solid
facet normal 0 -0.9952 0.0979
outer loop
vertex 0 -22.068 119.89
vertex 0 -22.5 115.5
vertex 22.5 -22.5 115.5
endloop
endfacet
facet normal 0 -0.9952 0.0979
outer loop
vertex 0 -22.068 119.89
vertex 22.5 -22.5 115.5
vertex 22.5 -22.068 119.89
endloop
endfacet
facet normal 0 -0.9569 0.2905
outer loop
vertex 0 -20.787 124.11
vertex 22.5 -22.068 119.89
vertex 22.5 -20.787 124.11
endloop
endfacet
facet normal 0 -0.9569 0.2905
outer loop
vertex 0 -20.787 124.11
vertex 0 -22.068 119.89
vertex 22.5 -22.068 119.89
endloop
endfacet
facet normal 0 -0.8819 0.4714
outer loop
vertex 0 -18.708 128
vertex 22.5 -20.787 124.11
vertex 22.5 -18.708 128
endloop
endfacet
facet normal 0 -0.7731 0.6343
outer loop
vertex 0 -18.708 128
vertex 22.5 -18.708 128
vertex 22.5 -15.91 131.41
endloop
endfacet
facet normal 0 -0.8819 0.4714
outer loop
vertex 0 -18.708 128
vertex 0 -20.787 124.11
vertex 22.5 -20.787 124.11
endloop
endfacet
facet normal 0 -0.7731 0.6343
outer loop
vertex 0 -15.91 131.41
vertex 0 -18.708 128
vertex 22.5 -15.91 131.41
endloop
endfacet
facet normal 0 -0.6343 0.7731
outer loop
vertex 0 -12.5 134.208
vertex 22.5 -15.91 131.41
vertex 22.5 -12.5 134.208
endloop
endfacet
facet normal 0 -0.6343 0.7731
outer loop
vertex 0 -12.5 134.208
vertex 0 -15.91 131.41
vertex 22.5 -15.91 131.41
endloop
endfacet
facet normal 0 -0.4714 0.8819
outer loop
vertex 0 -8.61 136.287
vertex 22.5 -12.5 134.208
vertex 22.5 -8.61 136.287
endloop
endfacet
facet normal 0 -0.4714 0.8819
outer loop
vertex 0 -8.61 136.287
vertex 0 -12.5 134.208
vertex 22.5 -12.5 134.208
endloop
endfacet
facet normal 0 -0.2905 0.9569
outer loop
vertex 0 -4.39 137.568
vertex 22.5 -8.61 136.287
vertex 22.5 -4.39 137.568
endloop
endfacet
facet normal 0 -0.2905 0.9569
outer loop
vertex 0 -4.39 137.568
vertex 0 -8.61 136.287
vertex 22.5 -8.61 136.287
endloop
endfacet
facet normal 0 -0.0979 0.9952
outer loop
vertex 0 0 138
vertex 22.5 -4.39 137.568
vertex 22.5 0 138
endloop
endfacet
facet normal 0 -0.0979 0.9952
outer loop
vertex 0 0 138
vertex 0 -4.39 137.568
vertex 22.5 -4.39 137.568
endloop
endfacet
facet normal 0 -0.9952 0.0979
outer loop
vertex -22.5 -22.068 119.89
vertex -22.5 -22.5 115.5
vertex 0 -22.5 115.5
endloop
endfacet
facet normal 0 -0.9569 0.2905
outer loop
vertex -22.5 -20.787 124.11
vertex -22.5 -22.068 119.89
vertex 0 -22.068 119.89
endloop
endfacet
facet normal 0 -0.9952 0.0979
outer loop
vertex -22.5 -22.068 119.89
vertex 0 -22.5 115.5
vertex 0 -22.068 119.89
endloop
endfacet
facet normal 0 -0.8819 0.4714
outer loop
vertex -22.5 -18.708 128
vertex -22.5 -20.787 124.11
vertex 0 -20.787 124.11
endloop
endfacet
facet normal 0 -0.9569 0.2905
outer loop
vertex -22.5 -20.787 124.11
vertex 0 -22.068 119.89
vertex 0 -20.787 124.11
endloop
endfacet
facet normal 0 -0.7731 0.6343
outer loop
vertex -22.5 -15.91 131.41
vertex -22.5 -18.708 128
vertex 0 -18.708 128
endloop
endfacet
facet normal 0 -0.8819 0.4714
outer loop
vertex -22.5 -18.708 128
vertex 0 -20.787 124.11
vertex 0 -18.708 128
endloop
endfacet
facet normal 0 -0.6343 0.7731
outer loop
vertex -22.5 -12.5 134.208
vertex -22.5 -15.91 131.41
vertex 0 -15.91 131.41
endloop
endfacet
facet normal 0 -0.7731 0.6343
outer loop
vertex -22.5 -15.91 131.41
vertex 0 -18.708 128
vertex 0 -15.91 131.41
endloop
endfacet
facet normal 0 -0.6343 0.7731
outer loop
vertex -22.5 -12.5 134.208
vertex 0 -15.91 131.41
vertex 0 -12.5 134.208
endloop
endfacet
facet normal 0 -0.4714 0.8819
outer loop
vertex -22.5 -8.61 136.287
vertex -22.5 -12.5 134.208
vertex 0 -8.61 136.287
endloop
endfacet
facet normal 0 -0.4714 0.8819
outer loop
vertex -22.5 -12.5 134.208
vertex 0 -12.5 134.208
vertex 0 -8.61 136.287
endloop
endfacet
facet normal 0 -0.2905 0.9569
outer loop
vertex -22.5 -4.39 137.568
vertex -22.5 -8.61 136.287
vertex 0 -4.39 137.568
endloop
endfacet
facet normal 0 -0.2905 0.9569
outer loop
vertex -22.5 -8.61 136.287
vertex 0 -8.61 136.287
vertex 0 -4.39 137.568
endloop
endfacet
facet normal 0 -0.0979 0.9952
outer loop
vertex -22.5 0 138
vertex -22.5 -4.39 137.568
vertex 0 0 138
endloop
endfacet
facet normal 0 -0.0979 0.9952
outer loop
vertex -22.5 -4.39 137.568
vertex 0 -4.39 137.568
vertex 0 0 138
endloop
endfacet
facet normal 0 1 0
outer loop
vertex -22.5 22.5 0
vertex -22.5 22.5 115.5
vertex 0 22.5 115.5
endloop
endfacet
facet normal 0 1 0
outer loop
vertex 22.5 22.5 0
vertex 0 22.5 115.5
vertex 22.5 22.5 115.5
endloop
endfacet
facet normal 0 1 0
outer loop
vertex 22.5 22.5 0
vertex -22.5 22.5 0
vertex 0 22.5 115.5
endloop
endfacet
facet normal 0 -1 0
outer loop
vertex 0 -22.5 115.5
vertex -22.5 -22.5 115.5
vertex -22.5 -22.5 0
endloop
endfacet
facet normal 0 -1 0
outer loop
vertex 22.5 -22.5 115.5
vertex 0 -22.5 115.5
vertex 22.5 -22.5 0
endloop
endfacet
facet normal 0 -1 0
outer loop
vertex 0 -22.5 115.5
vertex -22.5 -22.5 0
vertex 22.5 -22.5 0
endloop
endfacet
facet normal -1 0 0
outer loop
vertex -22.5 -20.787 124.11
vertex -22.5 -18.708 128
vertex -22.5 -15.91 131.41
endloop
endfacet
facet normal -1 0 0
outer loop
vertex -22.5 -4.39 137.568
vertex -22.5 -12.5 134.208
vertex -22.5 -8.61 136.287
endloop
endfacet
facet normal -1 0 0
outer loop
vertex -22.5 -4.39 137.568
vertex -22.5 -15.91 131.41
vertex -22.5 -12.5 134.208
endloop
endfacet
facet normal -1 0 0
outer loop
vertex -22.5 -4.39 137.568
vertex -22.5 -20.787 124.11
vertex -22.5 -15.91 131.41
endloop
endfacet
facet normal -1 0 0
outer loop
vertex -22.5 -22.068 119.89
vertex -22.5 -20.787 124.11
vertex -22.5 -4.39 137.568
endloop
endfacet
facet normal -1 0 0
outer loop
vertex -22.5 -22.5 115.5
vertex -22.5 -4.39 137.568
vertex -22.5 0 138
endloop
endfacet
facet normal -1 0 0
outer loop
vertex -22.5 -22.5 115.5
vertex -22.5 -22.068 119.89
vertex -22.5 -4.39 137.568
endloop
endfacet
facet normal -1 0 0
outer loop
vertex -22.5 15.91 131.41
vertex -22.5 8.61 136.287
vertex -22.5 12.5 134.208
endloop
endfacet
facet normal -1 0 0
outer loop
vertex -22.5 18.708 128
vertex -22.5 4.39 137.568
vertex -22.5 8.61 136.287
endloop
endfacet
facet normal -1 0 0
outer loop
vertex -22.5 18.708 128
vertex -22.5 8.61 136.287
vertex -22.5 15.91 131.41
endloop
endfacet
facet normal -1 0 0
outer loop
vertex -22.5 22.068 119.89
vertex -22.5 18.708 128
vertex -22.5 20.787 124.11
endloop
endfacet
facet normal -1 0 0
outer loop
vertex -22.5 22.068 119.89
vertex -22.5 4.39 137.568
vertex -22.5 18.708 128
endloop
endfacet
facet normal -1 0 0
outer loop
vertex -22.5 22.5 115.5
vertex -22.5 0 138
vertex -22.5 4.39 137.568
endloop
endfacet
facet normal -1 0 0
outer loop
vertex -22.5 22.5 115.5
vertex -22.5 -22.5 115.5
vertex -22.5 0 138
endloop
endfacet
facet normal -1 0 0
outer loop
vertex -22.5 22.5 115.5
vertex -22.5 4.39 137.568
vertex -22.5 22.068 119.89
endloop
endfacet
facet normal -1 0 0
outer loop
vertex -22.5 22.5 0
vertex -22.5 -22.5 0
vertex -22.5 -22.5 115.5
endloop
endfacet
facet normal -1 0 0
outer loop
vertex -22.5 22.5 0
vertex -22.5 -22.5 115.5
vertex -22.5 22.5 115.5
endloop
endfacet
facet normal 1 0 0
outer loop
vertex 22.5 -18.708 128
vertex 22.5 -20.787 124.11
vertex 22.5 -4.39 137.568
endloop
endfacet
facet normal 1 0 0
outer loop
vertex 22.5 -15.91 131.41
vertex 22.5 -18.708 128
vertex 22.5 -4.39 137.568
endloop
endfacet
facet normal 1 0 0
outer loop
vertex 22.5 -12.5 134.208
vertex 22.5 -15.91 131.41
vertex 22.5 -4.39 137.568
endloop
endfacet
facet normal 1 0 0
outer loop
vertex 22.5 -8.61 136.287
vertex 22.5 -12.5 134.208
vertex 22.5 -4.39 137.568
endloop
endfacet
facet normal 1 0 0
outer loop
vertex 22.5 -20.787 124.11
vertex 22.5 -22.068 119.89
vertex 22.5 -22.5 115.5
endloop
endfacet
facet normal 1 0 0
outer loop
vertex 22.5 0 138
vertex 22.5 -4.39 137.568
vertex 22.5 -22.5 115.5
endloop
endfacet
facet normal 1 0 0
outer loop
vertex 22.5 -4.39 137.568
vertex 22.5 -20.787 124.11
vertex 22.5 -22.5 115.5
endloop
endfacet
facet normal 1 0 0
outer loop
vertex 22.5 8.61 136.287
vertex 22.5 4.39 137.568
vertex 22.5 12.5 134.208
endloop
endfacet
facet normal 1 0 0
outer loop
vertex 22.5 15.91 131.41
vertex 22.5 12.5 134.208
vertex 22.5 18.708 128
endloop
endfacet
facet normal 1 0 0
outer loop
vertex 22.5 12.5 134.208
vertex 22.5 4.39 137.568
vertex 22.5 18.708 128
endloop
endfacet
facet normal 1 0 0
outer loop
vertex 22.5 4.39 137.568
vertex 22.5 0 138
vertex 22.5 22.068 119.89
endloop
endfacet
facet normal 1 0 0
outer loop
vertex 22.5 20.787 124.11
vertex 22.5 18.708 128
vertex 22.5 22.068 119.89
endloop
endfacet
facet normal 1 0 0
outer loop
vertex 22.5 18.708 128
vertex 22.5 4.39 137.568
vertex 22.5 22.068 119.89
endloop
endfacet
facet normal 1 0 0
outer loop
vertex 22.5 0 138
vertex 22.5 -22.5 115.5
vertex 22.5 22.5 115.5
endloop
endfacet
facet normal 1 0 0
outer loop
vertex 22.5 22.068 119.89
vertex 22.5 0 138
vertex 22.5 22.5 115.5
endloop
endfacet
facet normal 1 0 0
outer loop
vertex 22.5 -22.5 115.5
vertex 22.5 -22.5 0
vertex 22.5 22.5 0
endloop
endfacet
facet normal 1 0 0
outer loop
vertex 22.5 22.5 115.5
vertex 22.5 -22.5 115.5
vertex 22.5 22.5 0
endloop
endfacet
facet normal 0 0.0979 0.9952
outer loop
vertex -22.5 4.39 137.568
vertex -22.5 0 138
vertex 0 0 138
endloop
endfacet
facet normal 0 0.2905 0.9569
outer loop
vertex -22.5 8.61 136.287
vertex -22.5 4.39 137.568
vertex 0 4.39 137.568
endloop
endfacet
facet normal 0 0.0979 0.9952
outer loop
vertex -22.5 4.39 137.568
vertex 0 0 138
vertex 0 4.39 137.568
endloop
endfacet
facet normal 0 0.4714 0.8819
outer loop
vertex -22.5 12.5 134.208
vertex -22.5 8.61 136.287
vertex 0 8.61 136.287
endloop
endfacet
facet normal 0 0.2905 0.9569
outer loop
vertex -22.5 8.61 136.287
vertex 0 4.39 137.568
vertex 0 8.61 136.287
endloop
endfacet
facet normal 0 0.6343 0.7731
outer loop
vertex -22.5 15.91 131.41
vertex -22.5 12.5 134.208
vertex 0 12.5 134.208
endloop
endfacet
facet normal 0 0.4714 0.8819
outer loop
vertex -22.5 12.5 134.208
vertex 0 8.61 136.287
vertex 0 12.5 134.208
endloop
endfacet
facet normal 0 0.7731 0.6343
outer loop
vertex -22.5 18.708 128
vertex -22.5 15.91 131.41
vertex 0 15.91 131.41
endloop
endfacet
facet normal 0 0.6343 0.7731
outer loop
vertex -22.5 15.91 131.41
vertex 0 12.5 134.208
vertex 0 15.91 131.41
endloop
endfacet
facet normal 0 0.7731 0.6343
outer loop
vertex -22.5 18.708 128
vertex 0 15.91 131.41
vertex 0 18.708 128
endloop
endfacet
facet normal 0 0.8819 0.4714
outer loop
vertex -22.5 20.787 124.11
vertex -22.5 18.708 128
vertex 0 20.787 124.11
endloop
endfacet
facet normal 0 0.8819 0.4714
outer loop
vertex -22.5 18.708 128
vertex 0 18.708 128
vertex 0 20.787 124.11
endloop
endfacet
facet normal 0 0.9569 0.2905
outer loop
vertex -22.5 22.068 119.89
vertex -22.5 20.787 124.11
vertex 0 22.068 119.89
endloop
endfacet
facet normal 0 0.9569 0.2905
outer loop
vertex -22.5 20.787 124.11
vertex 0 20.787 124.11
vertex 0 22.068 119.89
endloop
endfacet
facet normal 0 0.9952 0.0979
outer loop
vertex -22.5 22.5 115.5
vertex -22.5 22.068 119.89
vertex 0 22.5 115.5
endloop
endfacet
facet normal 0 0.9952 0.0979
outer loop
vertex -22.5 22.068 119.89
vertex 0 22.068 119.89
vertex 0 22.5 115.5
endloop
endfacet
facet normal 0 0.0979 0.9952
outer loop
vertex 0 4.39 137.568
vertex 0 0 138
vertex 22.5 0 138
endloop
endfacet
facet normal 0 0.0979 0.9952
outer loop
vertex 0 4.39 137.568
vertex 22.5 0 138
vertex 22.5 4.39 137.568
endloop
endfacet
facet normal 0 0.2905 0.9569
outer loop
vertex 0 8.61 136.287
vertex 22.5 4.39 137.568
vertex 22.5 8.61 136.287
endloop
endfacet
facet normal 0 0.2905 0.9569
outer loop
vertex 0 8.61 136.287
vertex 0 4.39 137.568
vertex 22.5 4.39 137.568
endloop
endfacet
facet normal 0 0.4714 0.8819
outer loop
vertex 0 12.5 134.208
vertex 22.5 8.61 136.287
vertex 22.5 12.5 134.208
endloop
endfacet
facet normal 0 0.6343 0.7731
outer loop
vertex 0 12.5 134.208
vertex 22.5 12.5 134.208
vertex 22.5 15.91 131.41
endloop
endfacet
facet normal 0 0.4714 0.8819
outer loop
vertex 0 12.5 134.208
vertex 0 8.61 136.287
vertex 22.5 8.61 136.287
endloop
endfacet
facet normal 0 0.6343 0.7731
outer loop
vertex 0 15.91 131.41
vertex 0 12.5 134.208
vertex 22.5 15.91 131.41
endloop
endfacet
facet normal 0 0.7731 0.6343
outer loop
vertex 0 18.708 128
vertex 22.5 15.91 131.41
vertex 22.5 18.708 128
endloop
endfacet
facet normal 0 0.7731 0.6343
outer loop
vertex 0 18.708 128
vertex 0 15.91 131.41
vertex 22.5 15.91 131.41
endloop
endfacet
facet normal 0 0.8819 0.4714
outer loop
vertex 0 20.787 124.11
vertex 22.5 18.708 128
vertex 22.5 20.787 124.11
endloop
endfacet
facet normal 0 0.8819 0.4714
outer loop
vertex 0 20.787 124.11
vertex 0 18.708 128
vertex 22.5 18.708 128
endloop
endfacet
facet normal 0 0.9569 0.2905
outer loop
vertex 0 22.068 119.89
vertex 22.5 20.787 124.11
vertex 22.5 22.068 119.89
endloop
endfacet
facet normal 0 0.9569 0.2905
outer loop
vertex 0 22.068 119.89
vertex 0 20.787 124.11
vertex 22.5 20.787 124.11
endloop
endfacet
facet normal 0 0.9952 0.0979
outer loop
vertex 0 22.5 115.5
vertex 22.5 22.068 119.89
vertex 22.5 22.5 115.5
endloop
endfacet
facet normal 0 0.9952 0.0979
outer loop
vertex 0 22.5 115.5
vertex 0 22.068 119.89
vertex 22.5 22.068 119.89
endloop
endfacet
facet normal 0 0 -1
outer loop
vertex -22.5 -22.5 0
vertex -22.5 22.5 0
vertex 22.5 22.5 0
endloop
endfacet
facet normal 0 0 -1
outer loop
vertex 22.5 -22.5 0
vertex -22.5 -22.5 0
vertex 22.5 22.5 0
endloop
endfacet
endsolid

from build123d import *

# Parameters (mm, degrees)
SKETCH1_W               = 45
SKETCH1_H               = 45
BOSS_EXTRUDE1_DEPTH     = 138
CUT_EXTRUDE1_DEPTH      = 23.5
CUT_EXTRUDE1_DEPTH_BACK = 23.5


with BuildPart() as part:
    # Sketch1 → Boss-Extrude1 (new body)
    with BuildSketch(Plane.XY):
        Rectangle(SKETCH1_W, SKETCH1_H)
    extrude(amount=BOSS_EXTRUDE1_DEPTH)

    # Sketch2 → Cut-Extrude1 (cut, two sides)
    with BuildSketch(Plane(origin=(0, 0, 0), x_dir=(0, 0, -1), z_dir=(1, 0, 0))) as cut_extrude1_sk:
        with BuildLine():
            Line((-138, 22.5), (-138, 0))
            ThreePointArc((-138, 0), (-131.409902577, 15.909902577), (-115.5, 22.5))
            Line((-115.5, 22.5), (-138, 22.5))
        make_face()
        with BuildLine():
            Line((-138, -22.5), (-115.5, -22.5))
            ThreePointArc((-115.5, -22.5), (-131.409902577, -15.909902577), (-138, 0))
            Line((-138, 0), (-138, -22.5))
        make_face()
    extrude(amount=CUT_EXTRUDE1_DEPTH, mode=Mode.SUBTRACT)
    extrude(cut_extrude1_sk.sketch, amount=-CUT_EXTRUDE1_DEPTH_BACK, mode=Mode.SUBTRACT)


solid = part.part
